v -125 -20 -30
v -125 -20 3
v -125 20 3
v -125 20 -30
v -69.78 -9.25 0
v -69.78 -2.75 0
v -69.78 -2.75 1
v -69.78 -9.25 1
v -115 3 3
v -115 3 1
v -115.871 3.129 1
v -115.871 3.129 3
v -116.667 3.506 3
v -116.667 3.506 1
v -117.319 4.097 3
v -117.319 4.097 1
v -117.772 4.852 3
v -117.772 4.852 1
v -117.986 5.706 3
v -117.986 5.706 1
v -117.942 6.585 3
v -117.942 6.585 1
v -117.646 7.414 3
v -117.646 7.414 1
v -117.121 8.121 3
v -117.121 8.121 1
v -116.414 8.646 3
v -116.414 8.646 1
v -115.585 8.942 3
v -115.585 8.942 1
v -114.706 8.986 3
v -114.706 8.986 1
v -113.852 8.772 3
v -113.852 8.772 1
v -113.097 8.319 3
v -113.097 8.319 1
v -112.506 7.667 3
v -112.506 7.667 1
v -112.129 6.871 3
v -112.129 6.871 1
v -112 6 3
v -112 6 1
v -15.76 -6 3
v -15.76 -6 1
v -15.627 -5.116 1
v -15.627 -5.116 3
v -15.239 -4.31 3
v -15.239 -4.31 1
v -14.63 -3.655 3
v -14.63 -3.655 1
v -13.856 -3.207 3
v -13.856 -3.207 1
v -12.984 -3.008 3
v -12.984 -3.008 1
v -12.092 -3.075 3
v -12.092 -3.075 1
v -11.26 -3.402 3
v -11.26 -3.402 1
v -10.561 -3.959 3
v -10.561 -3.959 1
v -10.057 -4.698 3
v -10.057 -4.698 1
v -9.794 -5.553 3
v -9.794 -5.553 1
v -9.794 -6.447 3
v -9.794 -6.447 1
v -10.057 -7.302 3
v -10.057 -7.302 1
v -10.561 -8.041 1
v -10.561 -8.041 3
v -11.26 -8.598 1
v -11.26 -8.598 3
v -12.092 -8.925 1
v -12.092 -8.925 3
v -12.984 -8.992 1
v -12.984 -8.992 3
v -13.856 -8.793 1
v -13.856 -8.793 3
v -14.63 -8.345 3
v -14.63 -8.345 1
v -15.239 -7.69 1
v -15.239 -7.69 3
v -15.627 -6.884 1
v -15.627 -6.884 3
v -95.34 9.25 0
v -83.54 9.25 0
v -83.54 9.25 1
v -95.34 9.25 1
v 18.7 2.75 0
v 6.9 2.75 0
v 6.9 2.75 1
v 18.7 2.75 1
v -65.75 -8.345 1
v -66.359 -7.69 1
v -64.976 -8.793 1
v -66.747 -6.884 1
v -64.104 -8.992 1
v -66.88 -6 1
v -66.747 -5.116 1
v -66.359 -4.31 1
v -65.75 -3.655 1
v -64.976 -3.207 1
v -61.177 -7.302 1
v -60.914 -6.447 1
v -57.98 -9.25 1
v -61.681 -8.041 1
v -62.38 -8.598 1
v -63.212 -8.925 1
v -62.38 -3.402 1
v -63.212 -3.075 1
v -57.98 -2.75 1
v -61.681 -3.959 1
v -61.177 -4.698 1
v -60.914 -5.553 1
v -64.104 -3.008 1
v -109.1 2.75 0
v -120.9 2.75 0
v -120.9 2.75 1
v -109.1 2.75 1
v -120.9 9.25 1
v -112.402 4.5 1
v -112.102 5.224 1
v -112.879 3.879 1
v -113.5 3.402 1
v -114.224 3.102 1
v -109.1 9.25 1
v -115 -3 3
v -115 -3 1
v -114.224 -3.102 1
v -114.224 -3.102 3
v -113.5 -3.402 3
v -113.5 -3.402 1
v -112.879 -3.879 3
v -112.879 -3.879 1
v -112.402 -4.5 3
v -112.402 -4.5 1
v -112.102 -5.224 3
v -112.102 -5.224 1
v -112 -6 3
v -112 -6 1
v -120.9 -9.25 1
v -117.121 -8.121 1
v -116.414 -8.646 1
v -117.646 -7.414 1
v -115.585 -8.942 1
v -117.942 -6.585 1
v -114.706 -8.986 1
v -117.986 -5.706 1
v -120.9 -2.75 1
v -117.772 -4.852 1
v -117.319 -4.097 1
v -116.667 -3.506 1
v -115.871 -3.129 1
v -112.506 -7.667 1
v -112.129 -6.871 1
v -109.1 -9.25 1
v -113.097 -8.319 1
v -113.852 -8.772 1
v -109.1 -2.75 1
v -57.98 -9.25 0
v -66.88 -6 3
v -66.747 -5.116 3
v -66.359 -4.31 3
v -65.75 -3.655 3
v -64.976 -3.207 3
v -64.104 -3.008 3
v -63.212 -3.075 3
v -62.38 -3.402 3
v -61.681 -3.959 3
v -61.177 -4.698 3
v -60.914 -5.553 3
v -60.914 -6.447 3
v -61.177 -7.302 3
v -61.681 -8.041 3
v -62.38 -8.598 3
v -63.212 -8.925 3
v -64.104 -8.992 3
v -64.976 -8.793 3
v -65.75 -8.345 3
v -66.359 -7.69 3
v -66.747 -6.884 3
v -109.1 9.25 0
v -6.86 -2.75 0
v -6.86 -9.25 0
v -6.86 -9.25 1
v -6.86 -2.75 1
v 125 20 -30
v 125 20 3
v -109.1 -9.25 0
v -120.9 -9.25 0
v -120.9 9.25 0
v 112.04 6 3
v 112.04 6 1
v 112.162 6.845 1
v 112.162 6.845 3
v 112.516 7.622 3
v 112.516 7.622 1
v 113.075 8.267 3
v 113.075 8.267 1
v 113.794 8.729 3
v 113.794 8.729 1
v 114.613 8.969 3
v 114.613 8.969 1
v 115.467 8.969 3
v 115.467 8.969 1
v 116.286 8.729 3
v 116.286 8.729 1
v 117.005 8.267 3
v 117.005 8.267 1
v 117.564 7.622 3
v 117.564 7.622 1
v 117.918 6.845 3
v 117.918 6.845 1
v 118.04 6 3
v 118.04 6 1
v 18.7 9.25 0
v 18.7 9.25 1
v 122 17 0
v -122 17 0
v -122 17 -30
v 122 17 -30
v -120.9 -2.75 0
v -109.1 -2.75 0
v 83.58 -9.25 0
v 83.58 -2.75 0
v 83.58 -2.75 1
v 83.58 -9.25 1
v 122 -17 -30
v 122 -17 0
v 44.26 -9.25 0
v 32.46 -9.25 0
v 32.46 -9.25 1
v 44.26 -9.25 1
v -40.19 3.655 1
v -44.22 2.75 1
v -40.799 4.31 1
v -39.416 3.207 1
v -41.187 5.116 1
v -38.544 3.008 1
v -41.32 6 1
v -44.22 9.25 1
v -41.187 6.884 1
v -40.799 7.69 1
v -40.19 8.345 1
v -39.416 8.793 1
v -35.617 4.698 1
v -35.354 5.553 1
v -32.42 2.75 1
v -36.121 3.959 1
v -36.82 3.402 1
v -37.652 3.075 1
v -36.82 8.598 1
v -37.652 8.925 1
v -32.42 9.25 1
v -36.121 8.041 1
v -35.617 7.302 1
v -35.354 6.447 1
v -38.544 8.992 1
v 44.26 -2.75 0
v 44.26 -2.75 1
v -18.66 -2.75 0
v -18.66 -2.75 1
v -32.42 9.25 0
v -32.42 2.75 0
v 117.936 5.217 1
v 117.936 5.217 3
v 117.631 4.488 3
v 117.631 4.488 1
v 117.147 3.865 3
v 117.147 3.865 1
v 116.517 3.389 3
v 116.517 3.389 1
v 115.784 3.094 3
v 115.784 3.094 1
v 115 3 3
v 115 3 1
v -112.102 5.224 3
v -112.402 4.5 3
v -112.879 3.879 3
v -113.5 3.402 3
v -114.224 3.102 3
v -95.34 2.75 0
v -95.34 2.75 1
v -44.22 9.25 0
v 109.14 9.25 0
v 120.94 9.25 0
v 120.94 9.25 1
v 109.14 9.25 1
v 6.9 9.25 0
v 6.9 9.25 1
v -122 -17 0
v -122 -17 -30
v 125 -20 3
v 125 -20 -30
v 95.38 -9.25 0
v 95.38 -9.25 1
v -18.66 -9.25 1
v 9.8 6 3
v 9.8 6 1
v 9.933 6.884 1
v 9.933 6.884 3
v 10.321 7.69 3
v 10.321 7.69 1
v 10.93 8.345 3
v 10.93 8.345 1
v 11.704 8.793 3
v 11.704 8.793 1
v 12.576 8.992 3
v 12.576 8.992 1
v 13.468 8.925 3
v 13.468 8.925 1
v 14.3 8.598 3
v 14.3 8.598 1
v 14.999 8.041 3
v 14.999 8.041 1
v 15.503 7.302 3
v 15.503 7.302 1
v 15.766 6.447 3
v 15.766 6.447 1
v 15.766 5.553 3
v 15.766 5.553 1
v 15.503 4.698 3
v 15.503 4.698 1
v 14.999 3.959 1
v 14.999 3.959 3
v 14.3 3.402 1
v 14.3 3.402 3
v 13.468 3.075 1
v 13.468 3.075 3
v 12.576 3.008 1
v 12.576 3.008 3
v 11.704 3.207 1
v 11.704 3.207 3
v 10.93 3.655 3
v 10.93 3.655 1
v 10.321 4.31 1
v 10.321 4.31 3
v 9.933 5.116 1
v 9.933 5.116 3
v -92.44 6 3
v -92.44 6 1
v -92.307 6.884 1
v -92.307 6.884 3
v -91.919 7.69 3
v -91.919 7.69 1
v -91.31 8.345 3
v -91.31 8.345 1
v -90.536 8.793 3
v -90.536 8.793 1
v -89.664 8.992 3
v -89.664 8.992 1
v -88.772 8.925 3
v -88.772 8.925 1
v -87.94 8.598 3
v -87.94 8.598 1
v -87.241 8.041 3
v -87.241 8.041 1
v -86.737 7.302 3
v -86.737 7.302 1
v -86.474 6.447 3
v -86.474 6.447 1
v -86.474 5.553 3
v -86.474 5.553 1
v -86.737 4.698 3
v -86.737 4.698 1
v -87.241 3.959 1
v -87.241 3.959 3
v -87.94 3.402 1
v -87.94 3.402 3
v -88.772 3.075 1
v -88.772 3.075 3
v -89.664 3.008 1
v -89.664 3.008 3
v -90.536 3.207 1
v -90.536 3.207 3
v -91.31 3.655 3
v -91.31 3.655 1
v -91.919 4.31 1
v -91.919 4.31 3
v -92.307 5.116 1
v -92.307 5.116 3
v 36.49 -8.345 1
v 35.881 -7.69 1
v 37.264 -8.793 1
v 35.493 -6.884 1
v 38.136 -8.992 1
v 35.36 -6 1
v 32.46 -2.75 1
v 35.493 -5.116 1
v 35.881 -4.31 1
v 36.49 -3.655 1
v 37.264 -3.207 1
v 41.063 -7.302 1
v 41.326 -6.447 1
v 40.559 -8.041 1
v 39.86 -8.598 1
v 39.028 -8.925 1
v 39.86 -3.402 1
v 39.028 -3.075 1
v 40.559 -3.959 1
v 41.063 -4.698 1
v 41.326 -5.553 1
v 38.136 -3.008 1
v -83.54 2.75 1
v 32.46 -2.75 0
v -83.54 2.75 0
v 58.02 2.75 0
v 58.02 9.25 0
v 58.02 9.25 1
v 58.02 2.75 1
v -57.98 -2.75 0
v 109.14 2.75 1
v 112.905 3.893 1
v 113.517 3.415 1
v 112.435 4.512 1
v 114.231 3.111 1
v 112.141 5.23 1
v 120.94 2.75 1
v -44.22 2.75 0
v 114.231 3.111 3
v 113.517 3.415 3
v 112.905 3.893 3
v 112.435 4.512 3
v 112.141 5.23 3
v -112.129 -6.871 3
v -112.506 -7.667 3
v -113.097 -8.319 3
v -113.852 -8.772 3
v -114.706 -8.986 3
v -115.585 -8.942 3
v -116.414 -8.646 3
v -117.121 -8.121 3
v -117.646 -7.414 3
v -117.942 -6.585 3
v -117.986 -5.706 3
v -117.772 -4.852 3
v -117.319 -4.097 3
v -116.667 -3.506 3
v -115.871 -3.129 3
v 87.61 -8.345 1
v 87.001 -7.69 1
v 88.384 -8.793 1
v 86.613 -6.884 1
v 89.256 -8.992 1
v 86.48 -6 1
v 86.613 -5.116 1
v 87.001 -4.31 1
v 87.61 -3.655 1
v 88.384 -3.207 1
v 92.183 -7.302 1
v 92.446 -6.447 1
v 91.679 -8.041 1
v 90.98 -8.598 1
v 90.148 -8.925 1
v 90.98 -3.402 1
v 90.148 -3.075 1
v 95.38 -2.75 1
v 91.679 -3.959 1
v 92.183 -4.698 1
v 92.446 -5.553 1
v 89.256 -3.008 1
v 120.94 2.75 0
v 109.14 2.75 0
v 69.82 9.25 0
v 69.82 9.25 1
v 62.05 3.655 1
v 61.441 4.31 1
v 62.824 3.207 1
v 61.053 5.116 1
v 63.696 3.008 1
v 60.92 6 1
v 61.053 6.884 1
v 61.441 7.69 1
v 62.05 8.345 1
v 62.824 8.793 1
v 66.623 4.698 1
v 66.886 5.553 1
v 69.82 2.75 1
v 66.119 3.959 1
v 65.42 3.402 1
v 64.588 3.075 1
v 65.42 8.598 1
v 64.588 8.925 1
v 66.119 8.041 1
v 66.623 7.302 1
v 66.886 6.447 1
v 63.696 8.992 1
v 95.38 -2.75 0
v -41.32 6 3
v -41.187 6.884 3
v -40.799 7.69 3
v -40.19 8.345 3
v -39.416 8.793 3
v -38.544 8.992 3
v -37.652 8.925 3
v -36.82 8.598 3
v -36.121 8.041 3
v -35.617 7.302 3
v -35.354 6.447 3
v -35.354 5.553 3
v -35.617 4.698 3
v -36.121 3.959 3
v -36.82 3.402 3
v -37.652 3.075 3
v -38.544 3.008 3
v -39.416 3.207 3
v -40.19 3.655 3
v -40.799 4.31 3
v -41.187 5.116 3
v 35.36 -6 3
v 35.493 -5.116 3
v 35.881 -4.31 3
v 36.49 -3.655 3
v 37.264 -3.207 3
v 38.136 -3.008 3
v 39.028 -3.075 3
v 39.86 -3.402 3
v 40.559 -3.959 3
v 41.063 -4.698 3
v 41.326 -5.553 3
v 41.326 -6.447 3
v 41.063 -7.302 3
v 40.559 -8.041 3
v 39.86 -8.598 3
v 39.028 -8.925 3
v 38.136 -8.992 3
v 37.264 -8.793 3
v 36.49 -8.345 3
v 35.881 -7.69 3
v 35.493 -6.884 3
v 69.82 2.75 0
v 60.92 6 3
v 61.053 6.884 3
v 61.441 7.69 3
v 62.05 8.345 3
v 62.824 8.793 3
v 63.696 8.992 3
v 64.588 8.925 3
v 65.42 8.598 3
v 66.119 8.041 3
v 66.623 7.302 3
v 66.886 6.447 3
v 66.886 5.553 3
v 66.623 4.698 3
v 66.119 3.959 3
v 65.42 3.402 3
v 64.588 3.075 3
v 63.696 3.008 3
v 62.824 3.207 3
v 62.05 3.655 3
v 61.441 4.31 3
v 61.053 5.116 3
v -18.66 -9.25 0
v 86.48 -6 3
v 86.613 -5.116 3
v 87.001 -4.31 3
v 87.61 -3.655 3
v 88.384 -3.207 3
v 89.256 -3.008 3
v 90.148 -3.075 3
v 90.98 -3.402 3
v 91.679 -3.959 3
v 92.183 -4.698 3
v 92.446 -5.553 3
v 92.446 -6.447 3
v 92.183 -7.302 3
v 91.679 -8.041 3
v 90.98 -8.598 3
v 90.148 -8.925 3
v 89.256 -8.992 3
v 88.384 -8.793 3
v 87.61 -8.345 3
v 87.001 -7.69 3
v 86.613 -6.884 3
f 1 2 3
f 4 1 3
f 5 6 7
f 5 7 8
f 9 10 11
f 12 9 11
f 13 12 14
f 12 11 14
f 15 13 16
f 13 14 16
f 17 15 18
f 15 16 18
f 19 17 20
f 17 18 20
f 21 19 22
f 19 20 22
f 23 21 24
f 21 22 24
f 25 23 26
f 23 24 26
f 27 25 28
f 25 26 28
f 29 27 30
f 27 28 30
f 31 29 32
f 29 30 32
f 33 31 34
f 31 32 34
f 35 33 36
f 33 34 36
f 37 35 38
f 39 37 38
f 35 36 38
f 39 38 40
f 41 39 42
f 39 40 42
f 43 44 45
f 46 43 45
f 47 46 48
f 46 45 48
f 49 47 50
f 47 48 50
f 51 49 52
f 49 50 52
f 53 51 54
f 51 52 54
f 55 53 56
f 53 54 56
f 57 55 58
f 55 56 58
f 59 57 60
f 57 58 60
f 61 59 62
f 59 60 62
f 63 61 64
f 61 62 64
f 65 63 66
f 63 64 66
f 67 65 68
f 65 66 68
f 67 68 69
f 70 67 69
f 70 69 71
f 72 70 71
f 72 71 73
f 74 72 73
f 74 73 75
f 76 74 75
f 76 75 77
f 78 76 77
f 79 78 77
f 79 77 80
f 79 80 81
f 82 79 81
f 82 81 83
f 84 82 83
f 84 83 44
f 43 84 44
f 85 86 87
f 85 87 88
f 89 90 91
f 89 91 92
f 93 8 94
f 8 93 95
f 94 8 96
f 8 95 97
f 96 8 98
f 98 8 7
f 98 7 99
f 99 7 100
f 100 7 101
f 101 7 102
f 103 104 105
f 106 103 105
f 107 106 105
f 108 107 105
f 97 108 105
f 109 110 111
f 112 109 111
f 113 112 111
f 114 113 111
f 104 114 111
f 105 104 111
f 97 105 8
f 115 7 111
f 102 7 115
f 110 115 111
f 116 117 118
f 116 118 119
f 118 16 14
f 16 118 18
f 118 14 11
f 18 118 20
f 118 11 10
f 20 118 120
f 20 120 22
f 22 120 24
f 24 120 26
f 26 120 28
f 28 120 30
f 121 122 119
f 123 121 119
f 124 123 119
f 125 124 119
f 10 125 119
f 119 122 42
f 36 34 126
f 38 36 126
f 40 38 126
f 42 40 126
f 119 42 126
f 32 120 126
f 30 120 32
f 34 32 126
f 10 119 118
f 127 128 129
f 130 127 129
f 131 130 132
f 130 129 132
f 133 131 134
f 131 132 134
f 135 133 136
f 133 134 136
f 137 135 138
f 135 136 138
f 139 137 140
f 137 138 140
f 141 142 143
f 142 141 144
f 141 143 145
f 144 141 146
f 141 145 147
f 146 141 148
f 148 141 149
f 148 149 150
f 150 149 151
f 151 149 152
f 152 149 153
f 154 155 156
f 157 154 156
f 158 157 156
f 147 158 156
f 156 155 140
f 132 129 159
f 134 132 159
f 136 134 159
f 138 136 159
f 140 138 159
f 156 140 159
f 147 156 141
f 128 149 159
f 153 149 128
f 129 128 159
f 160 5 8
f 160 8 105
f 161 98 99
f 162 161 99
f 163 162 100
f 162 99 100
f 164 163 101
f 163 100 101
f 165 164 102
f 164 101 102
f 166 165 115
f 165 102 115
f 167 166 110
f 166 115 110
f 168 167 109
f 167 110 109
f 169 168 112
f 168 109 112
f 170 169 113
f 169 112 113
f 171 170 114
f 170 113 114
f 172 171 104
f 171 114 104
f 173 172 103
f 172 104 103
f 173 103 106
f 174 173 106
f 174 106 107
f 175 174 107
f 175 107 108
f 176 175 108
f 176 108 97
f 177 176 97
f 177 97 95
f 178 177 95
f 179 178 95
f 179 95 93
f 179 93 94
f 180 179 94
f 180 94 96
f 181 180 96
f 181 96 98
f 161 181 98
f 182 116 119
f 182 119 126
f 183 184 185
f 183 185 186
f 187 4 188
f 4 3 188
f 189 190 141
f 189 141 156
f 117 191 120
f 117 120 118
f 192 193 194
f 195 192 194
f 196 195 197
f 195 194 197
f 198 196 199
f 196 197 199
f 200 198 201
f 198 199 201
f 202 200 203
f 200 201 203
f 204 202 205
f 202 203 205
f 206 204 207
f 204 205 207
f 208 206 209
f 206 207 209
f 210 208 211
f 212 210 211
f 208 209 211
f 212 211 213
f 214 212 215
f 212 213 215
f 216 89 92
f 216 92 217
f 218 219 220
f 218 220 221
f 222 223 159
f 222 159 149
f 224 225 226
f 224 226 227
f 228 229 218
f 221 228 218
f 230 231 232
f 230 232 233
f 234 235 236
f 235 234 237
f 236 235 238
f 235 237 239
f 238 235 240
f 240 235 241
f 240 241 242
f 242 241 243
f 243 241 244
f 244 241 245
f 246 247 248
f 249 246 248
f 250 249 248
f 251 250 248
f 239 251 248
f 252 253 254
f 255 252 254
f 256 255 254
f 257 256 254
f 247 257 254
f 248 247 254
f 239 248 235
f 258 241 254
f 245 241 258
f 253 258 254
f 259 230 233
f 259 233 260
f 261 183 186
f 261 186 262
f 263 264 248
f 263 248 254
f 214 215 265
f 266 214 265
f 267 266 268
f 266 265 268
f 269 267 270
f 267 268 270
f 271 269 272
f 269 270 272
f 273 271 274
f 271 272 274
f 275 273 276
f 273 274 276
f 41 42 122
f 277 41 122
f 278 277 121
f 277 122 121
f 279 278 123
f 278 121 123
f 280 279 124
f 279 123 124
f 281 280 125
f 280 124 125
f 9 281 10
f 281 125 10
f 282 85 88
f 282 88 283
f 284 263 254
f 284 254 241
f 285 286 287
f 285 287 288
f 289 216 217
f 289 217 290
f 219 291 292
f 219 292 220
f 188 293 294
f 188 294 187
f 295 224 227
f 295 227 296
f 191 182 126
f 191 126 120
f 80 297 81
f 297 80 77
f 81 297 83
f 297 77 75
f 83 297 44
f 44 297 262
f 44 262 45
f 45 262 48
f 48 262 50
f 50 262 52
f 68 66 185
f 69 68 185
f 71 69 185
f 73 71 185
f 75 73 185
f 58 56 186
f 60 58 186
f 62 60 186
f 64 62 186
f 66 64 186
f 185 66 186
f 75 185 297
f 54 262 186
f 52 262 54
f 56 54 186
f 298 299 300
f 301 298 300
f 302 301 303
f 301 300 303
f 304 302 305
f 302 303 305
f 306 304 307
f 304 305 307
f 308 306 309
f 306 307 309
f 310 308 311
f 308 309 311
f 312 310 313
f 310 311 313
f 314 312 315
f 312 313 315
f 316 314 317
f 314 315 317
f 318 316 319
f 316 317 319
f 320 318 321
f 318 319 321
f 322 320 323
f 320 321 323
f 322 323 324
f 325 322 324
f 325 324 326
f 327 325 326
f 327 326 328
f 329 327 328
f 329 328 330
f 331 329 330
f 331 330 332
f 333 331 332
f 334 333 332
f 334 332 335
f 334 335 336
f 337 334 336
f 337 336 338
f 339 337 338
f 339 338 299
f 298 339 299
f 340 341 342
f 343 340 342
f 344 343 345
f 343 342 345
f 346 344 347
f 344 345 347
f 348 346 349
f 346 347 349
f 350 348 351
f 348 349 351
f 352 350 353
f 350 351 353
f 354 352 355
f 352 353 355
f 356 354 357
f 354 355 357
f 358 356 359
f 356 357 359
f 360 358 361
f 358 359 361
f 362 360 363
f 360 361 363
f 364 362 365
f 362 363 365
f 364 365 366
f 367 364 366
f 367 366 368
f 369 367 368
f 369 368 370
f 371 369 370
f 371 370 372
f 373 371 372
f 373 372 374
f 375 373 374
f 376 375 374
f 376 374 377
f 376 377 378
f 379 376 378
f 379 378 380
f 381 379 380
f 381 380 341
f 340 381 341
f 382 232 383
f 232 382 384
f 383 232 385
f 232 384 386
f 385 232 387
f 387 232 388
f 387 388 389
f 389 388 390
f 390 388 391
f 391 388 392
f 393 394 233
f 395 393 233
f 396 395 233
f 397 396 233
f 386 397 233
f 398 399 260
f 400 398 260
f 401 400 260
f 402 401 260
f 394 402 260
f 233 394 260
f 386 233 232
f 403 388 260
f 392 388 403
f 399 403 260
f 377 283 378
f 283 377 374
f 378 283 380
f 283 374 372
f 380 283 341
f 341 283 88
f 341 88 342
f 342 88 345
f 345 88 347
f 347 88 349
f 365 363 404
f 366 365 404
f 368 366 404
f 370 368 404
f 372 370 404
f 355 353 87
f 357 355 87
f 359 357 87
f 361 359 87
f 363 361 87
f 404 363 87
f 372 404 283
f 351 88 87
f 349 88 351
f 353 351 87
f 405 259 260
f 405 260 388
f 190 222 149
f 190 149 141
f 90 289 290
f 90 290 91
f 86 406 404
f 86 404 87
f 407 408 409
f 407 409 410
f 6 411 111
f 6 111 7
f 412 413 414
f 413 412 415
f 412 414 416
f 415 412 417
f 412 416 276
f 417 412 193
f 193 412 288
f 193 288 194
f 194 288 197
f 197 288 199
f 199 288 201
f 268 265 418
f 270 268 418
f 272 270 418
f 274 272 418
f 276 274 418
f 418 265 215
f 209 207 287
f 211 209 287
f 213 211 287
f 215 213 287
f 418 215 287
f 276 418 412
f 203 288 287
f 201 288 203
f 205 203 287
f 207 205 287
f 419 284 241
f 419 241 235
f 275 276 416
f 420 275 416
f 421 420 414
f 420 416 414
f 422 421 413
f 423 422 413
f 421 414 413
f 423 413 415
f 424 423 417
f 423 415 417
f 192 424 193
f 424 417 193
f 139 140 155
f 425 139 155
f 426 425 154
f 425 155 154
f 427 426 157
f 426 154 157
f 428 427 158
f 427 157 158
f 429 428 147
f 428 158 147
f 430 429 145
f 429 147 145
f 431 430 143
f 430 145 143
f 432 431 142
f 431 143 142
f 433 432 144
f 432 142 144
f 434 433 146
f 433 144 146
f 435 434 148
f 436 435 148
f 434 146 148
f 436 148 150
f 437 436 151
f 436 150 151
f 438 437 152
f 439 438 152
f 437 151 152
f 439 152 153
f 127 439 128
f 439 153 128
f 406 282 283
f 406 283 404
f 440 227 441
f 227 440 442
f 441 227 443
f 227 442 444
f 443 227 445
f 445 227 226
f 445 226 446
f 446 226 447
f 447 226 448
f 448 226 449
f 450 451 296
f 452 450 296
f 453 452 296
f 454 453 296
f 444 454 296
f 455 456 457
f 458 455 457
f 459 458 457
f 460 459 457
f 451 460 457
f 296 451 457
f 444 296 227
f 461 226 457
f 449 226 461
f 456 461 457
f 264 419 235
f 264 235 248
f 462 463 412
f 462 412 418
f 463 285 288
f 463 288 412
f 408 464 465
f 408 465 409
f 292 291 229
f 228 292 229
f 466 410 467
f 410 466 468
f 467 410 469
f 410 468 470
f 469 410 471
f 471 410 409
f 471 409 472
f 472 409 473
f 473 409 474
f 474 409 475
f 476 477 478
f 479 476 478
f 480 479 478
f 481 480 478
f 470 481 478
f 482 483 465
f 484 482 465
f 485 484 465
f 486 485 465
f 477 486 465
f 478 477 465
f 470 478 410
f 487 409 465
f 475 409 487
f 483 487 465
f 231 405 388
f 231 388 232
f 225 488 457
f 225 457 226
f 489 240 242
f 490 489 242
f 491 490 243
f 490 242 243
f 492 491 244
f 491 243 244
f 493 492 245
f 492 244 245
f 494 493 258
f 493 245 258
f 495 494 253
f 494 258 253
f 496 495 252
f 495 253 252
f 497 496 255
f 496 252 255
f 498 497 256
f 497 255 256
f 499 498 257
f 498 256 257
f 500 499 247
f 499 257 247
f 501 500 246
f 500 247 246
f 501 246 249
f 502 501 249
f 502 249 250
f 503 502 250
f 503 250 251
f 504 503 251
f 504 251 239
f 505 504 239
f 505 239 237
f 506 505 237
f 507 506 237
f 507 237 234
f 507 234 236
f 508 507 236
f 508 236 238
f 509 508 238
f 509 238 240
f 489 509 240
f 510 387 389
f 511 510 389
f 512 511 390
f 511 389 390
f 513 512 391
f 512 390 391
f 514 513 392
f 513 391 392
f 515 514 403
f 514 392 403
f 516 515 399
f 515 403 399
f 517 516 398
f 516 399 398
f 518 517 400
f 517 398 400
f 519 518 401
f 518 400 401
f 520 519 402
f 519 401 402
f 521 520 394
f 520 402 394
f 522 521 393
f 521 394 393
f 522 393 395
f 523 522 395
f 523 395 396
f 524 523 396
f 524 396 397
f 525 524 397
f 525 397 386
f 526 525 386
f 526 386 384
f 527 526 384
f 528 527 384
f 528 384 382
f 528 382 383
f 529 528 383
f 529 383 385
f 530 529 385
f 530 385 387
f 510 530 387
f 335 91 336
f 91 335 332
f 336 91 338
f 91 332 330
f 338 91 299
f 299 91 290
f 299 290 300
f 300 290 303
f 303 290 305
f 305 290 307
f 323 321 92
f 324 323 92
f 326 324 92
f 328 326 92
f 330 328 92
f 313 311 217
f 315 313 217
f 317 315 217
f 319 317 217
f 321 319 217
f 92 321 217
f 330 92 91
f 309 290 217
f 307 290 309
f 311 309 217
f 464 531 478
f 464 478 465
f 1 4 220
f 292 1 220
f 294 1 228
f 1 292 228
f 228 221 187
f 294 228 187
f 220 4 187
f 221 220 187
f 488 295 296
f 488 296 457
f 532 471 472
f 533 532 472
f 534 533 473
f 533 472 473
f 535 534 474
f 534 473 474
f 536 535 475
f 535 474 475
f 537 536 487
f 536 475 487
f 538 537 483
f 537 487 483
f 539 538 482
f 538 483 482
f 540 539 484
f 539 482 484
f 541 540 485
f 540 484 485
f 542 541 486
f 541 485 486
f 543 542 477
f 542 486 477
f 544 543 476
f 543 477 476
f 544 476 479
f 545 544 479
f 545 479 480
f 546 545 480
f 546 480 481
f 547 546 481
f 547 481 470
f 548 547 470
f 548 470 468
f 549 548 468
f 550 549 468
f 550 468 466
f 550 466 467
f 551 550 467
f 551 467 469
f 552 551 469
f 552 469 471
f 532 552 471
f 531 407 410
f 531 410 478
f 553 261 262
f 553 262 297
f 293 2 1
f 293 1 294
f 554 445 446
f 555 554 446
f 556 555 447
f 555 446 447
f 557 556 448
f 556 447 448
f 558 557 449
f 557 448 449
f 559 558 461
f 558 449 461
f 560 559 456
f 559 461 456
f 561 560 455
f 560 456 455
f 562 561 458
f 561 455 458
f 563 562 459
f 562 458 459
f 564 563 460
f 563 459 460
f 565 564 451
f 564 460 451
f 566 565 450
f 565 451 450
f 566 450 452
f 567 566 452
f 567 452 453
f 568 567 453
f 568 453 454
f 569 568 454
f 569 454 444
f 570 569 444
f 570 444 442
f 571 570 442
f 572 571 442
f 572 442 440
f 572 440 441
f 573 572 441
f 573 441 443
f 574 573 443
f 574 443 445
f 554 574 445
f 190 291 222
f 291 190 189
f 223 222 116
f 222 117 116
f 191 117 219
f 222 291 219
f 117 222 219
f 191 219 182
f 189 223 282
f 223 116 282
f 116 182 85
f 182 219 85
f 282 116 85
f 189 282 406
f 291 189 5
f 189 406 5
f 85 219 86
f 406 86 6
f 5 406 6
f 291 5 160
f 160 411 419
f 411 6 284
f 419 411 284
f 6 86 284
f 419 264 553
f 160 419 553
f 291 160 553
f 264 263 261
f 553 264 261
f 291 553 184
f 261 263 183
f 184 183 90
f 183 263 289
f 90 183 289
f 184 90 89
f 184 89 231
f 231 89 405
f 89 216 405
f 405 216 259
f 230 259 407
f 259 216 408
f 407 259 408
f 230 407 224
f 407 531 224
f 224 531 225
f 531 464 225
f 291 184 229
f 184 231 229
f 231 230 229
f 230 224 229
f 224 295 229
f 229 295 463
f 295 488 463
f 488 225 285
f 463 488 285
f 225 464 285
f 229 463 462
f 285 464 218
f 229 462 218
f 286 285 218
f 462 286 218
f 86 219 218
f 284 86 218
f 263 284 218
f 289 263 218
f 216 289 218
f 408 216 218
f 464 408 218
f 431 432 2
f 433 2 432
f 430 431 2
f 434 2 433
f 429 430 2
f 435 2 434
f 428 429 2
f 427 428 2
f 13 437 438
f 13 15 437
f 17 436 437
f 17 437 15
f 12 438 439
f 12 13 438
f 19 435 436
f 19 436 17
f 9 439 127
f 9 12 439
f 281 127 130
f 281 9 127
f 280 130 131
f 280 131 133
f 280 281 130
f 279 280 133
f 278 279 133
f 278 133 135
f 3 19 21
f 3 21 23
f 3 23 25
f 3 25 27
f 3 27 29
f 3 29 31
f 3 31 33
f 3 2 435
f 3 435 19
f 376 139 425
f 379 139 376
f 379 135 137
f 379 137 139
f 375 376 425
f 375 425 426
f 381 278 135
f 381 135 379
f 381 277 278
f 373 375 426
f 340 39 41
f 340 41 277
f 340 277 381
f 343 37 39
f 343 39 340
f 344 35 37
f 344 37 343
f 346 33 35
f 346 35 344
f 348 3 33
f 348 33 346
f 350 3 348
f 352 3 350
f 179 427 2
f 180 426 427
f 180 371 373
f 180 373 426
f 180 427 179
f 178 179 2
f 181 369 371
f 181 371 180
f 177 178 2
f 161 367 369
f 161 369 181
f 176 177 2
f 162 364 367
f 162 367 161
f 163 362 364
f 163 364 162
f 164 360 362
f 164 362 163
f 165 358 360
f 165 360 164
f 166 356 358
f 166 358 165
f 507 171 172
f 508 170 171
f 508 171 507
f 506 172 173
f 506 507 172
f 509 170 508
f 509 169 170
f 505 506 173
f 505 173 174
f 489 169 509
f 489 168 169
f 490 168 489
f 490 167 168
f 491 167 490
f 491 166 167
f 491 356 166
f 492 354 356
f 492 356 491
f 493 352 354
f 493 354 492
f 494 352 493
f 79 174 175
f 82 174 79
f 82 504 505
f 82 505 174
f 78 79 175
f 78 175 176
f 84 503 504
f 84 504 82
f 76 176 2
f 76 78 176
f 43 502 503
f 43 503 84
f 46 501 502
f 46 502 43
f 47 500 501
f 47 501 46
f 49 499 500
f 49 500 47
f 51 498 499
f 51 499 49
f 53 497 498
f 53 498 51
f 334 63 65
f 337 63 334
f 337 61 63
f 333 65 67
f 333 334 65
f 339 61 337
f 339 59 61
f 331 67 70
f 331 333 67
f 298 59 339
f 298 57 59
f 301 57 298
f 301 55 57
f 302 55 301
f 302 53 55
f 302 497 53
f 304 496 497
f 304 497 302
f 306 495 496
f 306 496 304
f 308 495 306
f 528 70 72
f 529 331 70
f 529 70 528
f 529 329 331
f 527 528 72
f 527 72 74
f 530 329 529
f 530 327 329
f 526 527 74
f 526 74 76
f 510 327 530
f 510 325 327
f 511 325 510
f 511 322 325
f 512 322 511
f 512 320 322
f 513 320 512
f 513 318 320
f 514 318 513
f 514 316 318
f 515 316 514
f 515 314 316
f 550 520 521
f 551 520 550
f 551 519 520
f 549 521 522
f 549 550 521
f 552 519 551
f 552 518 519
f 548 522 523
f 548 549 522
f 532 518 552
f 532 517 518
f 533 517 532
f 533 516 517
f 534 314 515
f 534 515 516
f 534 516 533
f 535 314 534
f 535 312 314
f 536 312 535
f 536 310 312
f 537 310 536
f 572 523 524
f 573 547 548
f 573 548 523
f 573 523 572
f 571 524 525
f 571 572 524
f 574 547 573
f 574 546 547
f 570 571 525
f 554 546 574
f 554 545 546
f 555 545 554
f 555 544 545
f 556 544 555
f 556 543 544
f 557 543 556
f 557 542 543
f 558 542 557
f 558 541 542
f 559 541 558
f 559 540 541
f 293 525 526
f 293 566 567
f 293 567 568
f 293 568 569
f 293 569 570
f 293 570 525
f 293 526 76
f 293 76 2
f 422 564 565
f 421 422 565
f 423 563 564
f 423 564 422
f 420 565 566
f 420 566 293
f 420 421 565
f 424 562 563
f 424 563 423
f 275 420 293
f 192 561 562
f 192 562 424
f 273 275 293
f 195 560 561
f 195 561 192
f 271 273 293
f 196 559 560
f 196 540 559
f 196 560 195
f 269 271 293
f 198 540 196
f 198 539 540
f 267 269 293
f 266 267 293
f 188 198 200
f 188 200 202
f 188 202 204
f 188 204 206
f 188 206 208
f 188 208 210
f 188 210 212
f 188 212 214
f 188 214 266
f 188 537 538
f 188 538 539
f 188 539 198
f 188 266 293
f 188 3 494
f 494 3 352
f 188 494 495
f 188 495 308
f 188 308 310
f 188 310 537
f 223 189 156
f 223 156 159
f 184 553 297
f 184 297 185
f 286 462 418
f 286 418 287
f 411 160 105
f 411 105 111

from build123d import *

# Parameters (mm, degrees)
F0_W     = 250
F0_H     = 40
F0_W_2   = 244
F0_H_2   = 34
F1_DEPTH = 3
F2_DEPTH = 1
F3_DEPTH = 30


with BuildPart() as f1:
    # F0 (on Top) → F1 (new body)
    with BuildSketch(Plane.XY):
        Rectangle(F0_W, F0_H)
        Rectangle(F0_W_2, F0_H_2, mode=Mode.SUBTRACT)
        Rectangle(F0_W_2, F0_H_2)
        Polygon((-109.1, 9.25), (-109.1, 6), (-95.34, 6), (-95.34, 9.25), (-83.54, 9.25), (-83.54, 6), (-44.22, 6), (-44.22, 9.25), (-32.42, 9.25), (-32.42, 6), (6.9, 6), (6.9, 9.25), (18.7, 9.25), (18.7, 6), (58.02, 6), (58.02, 9.25), (69.82, 9.25), (69.82, 6), (109.14, 6), (109.14, 9.25), (120.94, 9.25), (120.94, 2.75), (115, 2.75), (115, -6), (95.38, -6), (95.38, -9.25), (83.58, -9.25), (83.58, -6), (44.26, -6), (44.26, -9.25), (32.46, -9.25), (32.46, -6), (-6.86, -6), (-6.86, -9.25), (-18.66, -9.25), (-18.66, -6), (-57.98, -6), (-57.98, -9.25), (-69.78, -9.25), (-69.78, -6), (-109.1, -6), (-109.1, -9.25), (-120.9, -9.25), (-120.9, -2.75), (-115, -2.75), (-115, 2.75), (-120.9, 2.75), (-120.9, 9.25), align=None, mode=Mode.SUBTRACT)
        Polygon((-95.34, 6), (-109.1, 6), (-109.1, 2.75), (-115, 2.75), (-115, -2.75), (-109.1, -2.75), (-109.1, -6), (-69.78, -6), (-69.78, -2.75), (-57.98, -2.75), (-57.98, -6), (-18.66, -6), (-18.66, -2.75), (-6.86, -2.75), (-6.86, -6), (32.46, -6), (32.46, -2.75), (44.26, -2.75), (44.26, -6), (83.58, -6), (83.58, -2.75), (95.38, -2.75), (95.38, -6), (115, -6), (115, 2.75), (109.14, 2.75), (109.14, 6), (69.82, 6), (69.82, 2.75), (58.02, 2.75), (58.02, 6), (18.7, 6), (18.7, 2.75), (6.9, 2.75), (6.9, 6), (-32.42, 6), (-32.42, 2.75), (-44.22, 2.75), (-44.22, 6), (-83.54, 6), (-83.54, 2.75), (-95.34, 2.75), align=None)
        with BuildLine():
            Line((109.14, 9.25), (109.14, 6))
            Line((109.14, 6), (112.04, 6))
            ThreePointArc((112.04, 6), (115.04, 9), (118.04, 6))
            ThreePointArc((118.04, 6), (117.1471307506, 3.8645843496), (115, 3.0002666785))
            Line((115, 3.0002666785), (115, 2.75))
            Line((115, 2.75), (120.94, 2.75))
            Line((120.94, 2.75), (120.94, 9.25))
            Line((120.94, 9.25), (109.14, 9.25))
        make_face()
        with BuildLine():
            Line((-115, -3), (-115, -2.75))
            Line((-115, -2.75), (-120.9, -2.75))
            Line((-120.9, -2.75), (-120.9, -9.25))
            Line((-120.9, -9.25), (-109.1, -9.25))
            Line((-109.1, -9.25), (-109.1, -6))
            Line((-109.1, -6), (-112, -6))
            ThreePointArc((-112, -6), (-117.1213203436, -8.1213203436), (-115, -3))
        make_face()
        with BuildLine():
            ThreePointArc((-115, 3), (-117.1213203436, 8.1213203436), (-112, 6))
            Line((-112, 6), (-109.1, 6))
            Line((-109.1, 6), (-109.1, 9.25))
            Line((-109.1, 9.25), (-120.9, 9.25))
            Line((-120.9, 9.25), (-120.9, 2.75))
            Line((-120.9, 2.75), (-115, 2.75))
            Line((-115, 2.75), (-115, 3))
        make_face()
        with BuildLine():
            Line((-15.76, -6), (-18.66, -6))
            Line((-18.66, -6), (-18.66, -9.25))
            Line((-18.66, -9.25), (-6.86, -9.25))
            Line((-6.86, -9.25), (-6.86, -6))
            Line((-6.86, -6), (-9.76, -6))
            ThreePointArc((-9.76, -6), (-12.76, -9), (-15.76, -6))
        make_face()
        with BuildLine():
            Line((-18.66, -2.75), (-18.66, -6))
            Line((-18.66, -6), (-15.76, -6))
            ThreePointArc((-15.76, -6), (-12.76, -3), (-9.76, -6))
            Line((-9.76, -6), (-6.86, -6))
            Line((-6.86, -6), (-6.86, -2.75))
            Line((-6.86, -2.75), (-18.66, -2.75))
        make_face()
        with BuildLine():
            Line((35.36, -6), (32.46, -6))
            Line((32.46, -6), (32.46, -9.25))
            Line((32.46, -9.25), (44.26, -9.25))
            Line((44.26, -9.25), (44.26, -6))
            Line((44.26, -6), (41.36, -6))
            ThreePointArc((41.36, -6), (38.36, -9), (35.36, -6))
        make_face()
        with BuildLine():
            Line((32.46, -2.75), (32.46, -6))
            Line((32.46, -6), (35.36, -6))
            ThreePointArc((35.36, -6), (38.36, -3), (41.36, -6))
            Line((41.36, -6), (44.26, -6))
            Line((44.26, -6), (44.26, -2.75))
            Line((44.26, -2.75), (32.46, -2.75))
        make_face()
        with BuildLine():
            Line((-92.44, 6), (-95.34, 6))
            Line((-95.34, 6), (-95.34, 2.75))
            Line((-95.34, 2.75), (-83.54, 2.75))
            Line((-83.54, 2.75), (-83.54, 6))
            Line((-83.54, 6), (-86.44, 6))
            ThreePointArc((-86.44, 6), (-89.44, 3), (-92.44, 6))
        make_face()
        with BuildLine():
            Line((-95.34, 9.25), (-95.34, 6))
            Line((-95.34, 6), (-92.44, 6))
            ThreePointArc((-92.44, 6), (-89.44, 9), (-86.44, 6))
            Line((-86.44, 6), (-83.54, 6))
            Line((-83.54, 6), (-83.54, 9.25))
            Line((-83.54, 9.25), (-95.34, 9.25))
        make_face()
        with BuildLine():
            Line((60.92, 6), (58.02, 6))
            Line((58.02, 6), (58.02, 2.75))
            Line((58.02, 2.75), (69.82, 2.75))
            Line((69.82, 2.75), (69.82, 6))
            Line((69.82, 6), (66.92, 6))
            ThreePointArc((66.92, 6), (63.92, 3), (60.92, 6))
        make_face()
        with BuildLine():
            Line((58.02, 9.25), (58.02, 6))
            Line((58.02, 6), (60.92, 6))
            ThreePointArc((60.92, 6), (63.92, 9), (66.92, 6))
            Line((66.92, 6), (69.82, 6))
            Line((69.82, 6), (69.82, 9.25))
            Line((69.82, 9.25), (58.02, 9.25))
        make_face()
        with BuildLine():
            Line((86.48, -6), (83.58, -6))
            Line((83.58, -6), (83.58, -9.25))
            Line((83.58, -9.25), (95.38, -9.25))
            Line((95.38, -9.25), (95.38, -6))
            Line((95.38, -6), (92.48, -6))
            ThreePointArc((92.48, -6), (89.48, -9), (86.48, -6))
        make_face()
        with BuildLine():
            Line((83.58, -2.75), (83.58, -6))
            Line((83.58, -6), (86.48, -6))
            ThreePointArc((86.48, -6), (89.48, -3), (92.48, -6))
            Line((92.48, -6), (95.38, -6))
            Line((95.38, -6), (95.38, -2.75))
            Line((95.38, -2.75), (83.58, -2.75))
        make_face()
        with BuildLine():
            Line((9.8, 6), (6.9, 6))
            Line((6.9, 6), (6.9, 2.75))
            Line((6.9, 2.75), (18.7, 2.75))
            Line((18.7, 2.75), (18.7, 6))
            Line((18.7, 6), (15.8, 6))
            ThreePointArc((15.8, 6), (12.8, 3), (9.8, 6))
        make_face()
        with BuildLine():
            Line((6.9, 9.25), (6.9, 6))
            Line((6.9, 6), (9.8, 6))
            ThreePointArc((9.8, 6), (12.8, 9), (15.8, 6))
            Line((15.8, 6), (18.7, 6))
            Line((18.7, 6), (18.7, 9.25))
            Line((18.7, 9.25), (6.9, 9.25))
        make_face()
        with BuildLine():
            Line((-41.32, 6), (-44.22, 6))
            Line((-44.22, 6), (-44.22, 2.75))
            Line((-44.22, 2.75), (-32.42, 2.75))
            Line((-32.42, 2.75), (-32.42, 6))
            Line((-32.42, 6), (-35.32, 6))
            ThreePointArc((-35.32, 6), (-38.32, 3), (-41.32, 6))
        make_face()
        with BuildLine():
            Line((-44.22, 9.25), (-44.22, 6))
            Line((-44.22, 6), (-41.32, 6))
            ThreePointArc((-41.32, 6), (-38.32, 9), (-35.32, 6))
            Line((-35.32, 6), (-32.42, 6))
            Line((-32.42, 6), (-32.42, 9.25))
            Line((-32.42, 9.25), (-44.22, 9.25))
        make_face()
        with BuildLine():
            Line((-66.88, -6), (-69.78, -6))
            Line((-69.78, -6), (-69.78, -9.25))
            Line((-69.78, -9.25), (-57.98, -9.25))
            Line((-57.98, -9.25), (-57.98, -6))
            Line((-57.98, -6), (-60.88, -6))
            ThreePointArc((-60.88, -6), (-63.88, -9), (-66.88, -6))
        make_face()
        with BuildLine():
            Line((-69.78, -2.75), (-69.78, -6))
            Line((-69.78, -6), (-66.88, -6))
            ThreePointArc((-66.88, -6), (-63.88, -3), (-60.88, -6))
            Line((-60.88, -6), (-57.98, -6))
            Line((-57.98, -6), (-57.98, -2.75))
            Line((-57.98, -2.75), (-69.78, -2.75))
        make_face()
        with BuildLine():
            Line((-109.1, -2.75), (-115, -2.75))
            Line((-115, -2.75), (-115, -3))
            ThreePointArc((-115, -3), (-112.8786796564, -3.8786796564), (-112, -6))
            Line((-112, -6), (-109.1, -6))
            Line((-109.1, -6), (-109.1, -2.75))
        make_face()
        with BuildLine():
            Line((-109.1, 6), (-112, 6))
            ThreePointArc((-112, 6), (-112.8786796564, 3.8786796564), (-115, 3))
            Line((-115, 3), (-115, 2.75))
            Line((-115, 2.75), (-109.1, 2.75))
            Line((-109.1, 2.75), (-109.1, 6))
        make_face()
        with BuildLine():
            Line((112.04, 6), (109.14, 6))
            Line((109.14, 6), (109.14, 2.75))
            Line((109.14, 2.75), (115, 2.75))
            Line((115, 2.75), (115, 3.0002666785))
            ThreePointArc((115, 3.0002666785), (112.9045843496, 3.8928692494), (112.04, 6))
        make_face()
    extrude(amount=F1_DEPTH)

    # F0 (on Top) → F2 (cut)
    with BuildSketch(Plane.XY):
        with BuildLine():
            Line((60.92, 6), (58.02, 6))
            Line((58.02, 6), (58.02, 2.75))
            Line((58.02, 2.75), (69.82, 2.75))
            Line((69.82, 2.75), (69.82, 6))
            Line((69.82, 6), (66.92, 6))
            ThreePointArc((66.92, 6), (63.92, 3), (60.92, 6))
        make_face()
        with BuildLine():
            Line((58.02, 9.25), (58.02, 6))
            Line((58.02, 6), (60.92, 6))
            ThreePointArc((60.92, 6), (63.92, 9), (66.92, 6))
            Line((66.92, 6), (69.82, 6))
            Line((69.82, 6), (69.82, 9.25))
            Line((69.82, 9.25), (58.02, 9.25))
        make_face()
        with BuildLine():
            Line((35.36, -6), (32.46, -6))
            Line((32.46, -6), (32.46, -9.25))
            Line((32.46, -9.25), (44.26, -9.25))
            Line((44.26, -9.25), (44.26, -6))
            Line((44.26, -6), (41.36, -6))
            ThreePointArc((41.36, -6), (38.36, -9), (35.36, -6))
        make_face()
        with BuildLine():
            Line((32.46, -2.75), (32.46, -6))
            Line((32.46, -6), (35.36, -6))
            ThreePointArc((35.36, -6), (38.36, -3), (41.36, -6))
            Line((41.36, -6), (44.26, -6))
            Line((44.26, -6), (44.26, -2.75))
            Line((44.26, -2.75), (32.46, -2.75))
        make_face()
        with BuildLine():
            Line((9.8, 6), (6.9, 6))
            Line((6.9, 6), (6.9, 2.75))
            Line((6.9, 2.75), (18.7, 2.75))
            Line((18.7, 2.75), (18.7, 6))
            Line((18.7, 6), (15.8, 6))
            ThreePointArc((15.8, 6), (12.8, 3), (9.8, 6))
        make_face()
        with BuildLine():
            Line((6.9, 9.25), (6.9, 6))
            Line((6.9, 6), (9.8, 6))
            ThreePointArc((9.8, 6), (12.8, 9), (15.8, 6))
            Line((15.8, 6), (18.7, 6))
            Line((18.7, 6), (18.7, 9.25))
            Line((18.7, 9.25), (6.9, 9.25))
        make_face()
        with BuildLine():
            Line((-15.76, -6), (-18.66, -6))
            Line((-18.66, -6), (-18.66, -9.25))
            Line((-18.66, -9.25), (-6.86, -9.25))
            Line((-6.86, -9.25), (-6.86, -6))
            Line((-6.86, -6), (-9.76, -6))
            ThreePointArc((-9.76, -6), (-12.76, -9), (-15.76, -6))
        make_face()
        with BuildLine():
            Line((-18.66, -2.75), (-18.66, -6))
            Line((-18.66, -6), (-15.76, -6))
            ThreePointArc((-15.76, -6), (-12.76, -3), (-9.76, -6))
            Line((-9.76, -6), (-6.86, -6))
            Line((-6.86, -6), (-6.86, -2.75))
            Line((-6.86, -2.75), (-18.66, -2.75))
        make_face()
        with BuildLine():
            Line((83.58, -2.75), (83.58, -6))
            Line((83.58, -6), (86.48, -6))
            ThreePointArc((86.48, -6), (89.48, -3), (92.48, -6))
            Line((92.48, -6), (95.38, -6))
            Line((95.38, -6), (95.38, -2.75))
            Line((95.38, -2.75), (83.58, -2.75))
        make_face()
        with BuildLine():
            Line((112.04, 6), (109.14, 6))
            Line((109.14, 6), (109.14, 2.75))
            Line((109.14, 2.75), (115, 2.75))
            Line((115, 2.75), (115, 3.0002666785))
            ThreePointArc((115, 3.0002666785), (112.9045843496, 3.8928692494), (112.04, 6))
        make_face()
        with BuildLine():
            Line((-41.32, 6), (-44.22, 6))
            Line((-44.22, 6), (-44.22, 2.75))
            Line((-44.22, 2.75), (-32.42, 2.75))
            Line((-32.42, 2.75), (-32.42, 6))
            Line((-32.42, 6), (-35.32, 6))
            ThreePointArc((-35.32, 6), (-38.32, 3), (-41.32, 6))
        make_face()
        with BuildLine():
            Line((-44.22, 9.25), (-44.22, 6))
            Line((-44.22, 6), (-41.32, 6))
            ThreePointArc((-41.32, 6), (-38.32, 9), (-35.32, 6))
            Line((-35.32, 6), (-32.42, 6))
            Line((-32.42, 6), (-32.42, 9.25))
            Line((-32.42, 9.25), (-44.22, 9.25))
        make_face()
        with BuildLine():
            Line((-66.88, -6), (-69.78, -6))
            Line((-69.78, -6), (-69.78, -9.25))
            Line((-69.78, -9.25), (-57.98, -9.25))
            Line((-57.98, -9.25), (-57.98, -6))
            Line((-57.98, -6), (-60.88, -6))
            ThreePointArc((-60.88, -6), (-63.88, -9), (-66.88, -6))
        make_face()
        with BuildLine():
            Line((-69.78, -2.75), (-69.78, -6))
            Line((-69.78, -6), (-66.88, -6))
            ThreePointArc((-66.88, -6), (-63.88, -3), (-60.88, -6))
            Line((-60.88, -6), (-57.98, -6))
            Line((-57.98, -6), (-57.98, -2.75))
            Line((-57.98, -2.75), (-69.78, -2.75))
        make_face()
        with BuildLine():
            Line((-92.44, 6), (-95.34, 6))
            Line((-95.34, 6), (-95.34, 2.75))
            Line((-95.34, 2.75), (-83.54, 2.75))
            Line((-83.54, 2.75), (-83.54, 6))
            Line((-83.54, 6), (-86.44, 6))
            ThreePointArc((-86.44, 6), (-89.44, 3), (-92.44, 6))
        make_face()
        with BuildLine():
            Line((-95.34, 9.25), (-95.34, 6))
            Line((-95.34, 6), (-92.44, 6))
            ThreePointArc((-92.44, 6), (-89.44, 9), (-86.44, 6))
            Line((-86.44, 6), (-83.54, 6))
            Line((-83.54, 6), (-83.54, 9.25))
            Line((-83.54, 9.25), (-95.34, 9.25))
        make_face()
        with BuildLine():
            Line((-109.1, 6), (-112, 6))
            ThreePointArc((-112, 6), (-112.8786796564, 3.8786796564), (-115, 3))
            Line((-115, 3), (-115, 2.75))
            Line((-115, 2.75), (-109.1, 2.75))
            Line((-109.1, 2.75), (-109.1, 6))
        make_face()
        with BuildLine():
            Line((-115, -3), (-115, -2.75))
            Line((-115, -2.75), (-120.9, -2.75))
            Line((-120.9, -2.75), (-120.9, -9.25))
            Line((-120.9, -9.25), (-109.1, -9.25))
            Line((-109.1, -9.25), (-109.1, -6))
            Line((-109.1, -6), (-112, -6))
            ThreePointArc((-112, -6), (-117.1213203436, -8.1213203436), (-115, -3))
        make_face()
        with BuildLine():
            Line((109.14, 9.25), (109.14, 6))
            Line((109.14, 6), (112.04, 6))
            ThreePointArc((112.04, 6), (115.04, 9), (118.04, 6))
            ThreePointArc((118.04, 6), (117.1471307506, 3.8645843496), (115, 3.0002666785))
            Line((115, 3.0002666785), (115, 2.75))
            Line((115, 2.75), (120.94, 2.75))
            Line((120.94, 2.75), (120.94, 9.25))
            Line((120.94, 9.25), (109.14, 9.25))
        make_face()
        with BuildLine():
            Line((86.48, -6), (83.58, -6))
            Line((83.58, -6), (83.58, -9.25))
            Line((83.58, -9.25), (95.38, -9.25))
            Line((95.38, -9.25), (95.38, -6))
            Line((95.38, -6), (92.48, -6))
            ThreePointArc((92.48, -6), (89.48, -9), (86.48, -6))
        make_face()
        with BuildLine():
            ThreePointArc((-115, 3), (-117.1213203436, 8.1213203436), (-112, 6))
            Line((-112, 6), (-109.1, 6))
            Line((-109.1, 6), (-109.1, 9.25))
            Line((-109.1, 9.25), (-120.9, 9.25))
            Line((-120.9, 9.25), (-120.9, 2.75))
            Line((-120.9, 2.75), (-115, 2.75))
            Line((-115, 2.75), (-115, 3))
        make_face()
        with BuildLine():
            Line((-109.1, -2.75), (-115, -2.75))
            Line((-115, -2.75), (-115, -3))
            ThreePointArc((-115, -3), (-112.8786796564, -3.8786796564), (-112, -6))
            Line((-112, -6), (-109.1, -6))
            Line((-109.1, -6), (-109.1, -2.75))
        make_face()
    extrude(amount=F2_DEPTH, mode=Mode.SUBTRACT)

    # F0 (on Top) → F3 (join)
    with BuildSketch(Plane.XY):
        Rectangle(F0_W, F0_H)
        Rectangle(F0_W_2, F0_H_2, mode=Mode.SUBTRACT)
    extrude(amount=-F3_DEPTH)


solid = f1.part
